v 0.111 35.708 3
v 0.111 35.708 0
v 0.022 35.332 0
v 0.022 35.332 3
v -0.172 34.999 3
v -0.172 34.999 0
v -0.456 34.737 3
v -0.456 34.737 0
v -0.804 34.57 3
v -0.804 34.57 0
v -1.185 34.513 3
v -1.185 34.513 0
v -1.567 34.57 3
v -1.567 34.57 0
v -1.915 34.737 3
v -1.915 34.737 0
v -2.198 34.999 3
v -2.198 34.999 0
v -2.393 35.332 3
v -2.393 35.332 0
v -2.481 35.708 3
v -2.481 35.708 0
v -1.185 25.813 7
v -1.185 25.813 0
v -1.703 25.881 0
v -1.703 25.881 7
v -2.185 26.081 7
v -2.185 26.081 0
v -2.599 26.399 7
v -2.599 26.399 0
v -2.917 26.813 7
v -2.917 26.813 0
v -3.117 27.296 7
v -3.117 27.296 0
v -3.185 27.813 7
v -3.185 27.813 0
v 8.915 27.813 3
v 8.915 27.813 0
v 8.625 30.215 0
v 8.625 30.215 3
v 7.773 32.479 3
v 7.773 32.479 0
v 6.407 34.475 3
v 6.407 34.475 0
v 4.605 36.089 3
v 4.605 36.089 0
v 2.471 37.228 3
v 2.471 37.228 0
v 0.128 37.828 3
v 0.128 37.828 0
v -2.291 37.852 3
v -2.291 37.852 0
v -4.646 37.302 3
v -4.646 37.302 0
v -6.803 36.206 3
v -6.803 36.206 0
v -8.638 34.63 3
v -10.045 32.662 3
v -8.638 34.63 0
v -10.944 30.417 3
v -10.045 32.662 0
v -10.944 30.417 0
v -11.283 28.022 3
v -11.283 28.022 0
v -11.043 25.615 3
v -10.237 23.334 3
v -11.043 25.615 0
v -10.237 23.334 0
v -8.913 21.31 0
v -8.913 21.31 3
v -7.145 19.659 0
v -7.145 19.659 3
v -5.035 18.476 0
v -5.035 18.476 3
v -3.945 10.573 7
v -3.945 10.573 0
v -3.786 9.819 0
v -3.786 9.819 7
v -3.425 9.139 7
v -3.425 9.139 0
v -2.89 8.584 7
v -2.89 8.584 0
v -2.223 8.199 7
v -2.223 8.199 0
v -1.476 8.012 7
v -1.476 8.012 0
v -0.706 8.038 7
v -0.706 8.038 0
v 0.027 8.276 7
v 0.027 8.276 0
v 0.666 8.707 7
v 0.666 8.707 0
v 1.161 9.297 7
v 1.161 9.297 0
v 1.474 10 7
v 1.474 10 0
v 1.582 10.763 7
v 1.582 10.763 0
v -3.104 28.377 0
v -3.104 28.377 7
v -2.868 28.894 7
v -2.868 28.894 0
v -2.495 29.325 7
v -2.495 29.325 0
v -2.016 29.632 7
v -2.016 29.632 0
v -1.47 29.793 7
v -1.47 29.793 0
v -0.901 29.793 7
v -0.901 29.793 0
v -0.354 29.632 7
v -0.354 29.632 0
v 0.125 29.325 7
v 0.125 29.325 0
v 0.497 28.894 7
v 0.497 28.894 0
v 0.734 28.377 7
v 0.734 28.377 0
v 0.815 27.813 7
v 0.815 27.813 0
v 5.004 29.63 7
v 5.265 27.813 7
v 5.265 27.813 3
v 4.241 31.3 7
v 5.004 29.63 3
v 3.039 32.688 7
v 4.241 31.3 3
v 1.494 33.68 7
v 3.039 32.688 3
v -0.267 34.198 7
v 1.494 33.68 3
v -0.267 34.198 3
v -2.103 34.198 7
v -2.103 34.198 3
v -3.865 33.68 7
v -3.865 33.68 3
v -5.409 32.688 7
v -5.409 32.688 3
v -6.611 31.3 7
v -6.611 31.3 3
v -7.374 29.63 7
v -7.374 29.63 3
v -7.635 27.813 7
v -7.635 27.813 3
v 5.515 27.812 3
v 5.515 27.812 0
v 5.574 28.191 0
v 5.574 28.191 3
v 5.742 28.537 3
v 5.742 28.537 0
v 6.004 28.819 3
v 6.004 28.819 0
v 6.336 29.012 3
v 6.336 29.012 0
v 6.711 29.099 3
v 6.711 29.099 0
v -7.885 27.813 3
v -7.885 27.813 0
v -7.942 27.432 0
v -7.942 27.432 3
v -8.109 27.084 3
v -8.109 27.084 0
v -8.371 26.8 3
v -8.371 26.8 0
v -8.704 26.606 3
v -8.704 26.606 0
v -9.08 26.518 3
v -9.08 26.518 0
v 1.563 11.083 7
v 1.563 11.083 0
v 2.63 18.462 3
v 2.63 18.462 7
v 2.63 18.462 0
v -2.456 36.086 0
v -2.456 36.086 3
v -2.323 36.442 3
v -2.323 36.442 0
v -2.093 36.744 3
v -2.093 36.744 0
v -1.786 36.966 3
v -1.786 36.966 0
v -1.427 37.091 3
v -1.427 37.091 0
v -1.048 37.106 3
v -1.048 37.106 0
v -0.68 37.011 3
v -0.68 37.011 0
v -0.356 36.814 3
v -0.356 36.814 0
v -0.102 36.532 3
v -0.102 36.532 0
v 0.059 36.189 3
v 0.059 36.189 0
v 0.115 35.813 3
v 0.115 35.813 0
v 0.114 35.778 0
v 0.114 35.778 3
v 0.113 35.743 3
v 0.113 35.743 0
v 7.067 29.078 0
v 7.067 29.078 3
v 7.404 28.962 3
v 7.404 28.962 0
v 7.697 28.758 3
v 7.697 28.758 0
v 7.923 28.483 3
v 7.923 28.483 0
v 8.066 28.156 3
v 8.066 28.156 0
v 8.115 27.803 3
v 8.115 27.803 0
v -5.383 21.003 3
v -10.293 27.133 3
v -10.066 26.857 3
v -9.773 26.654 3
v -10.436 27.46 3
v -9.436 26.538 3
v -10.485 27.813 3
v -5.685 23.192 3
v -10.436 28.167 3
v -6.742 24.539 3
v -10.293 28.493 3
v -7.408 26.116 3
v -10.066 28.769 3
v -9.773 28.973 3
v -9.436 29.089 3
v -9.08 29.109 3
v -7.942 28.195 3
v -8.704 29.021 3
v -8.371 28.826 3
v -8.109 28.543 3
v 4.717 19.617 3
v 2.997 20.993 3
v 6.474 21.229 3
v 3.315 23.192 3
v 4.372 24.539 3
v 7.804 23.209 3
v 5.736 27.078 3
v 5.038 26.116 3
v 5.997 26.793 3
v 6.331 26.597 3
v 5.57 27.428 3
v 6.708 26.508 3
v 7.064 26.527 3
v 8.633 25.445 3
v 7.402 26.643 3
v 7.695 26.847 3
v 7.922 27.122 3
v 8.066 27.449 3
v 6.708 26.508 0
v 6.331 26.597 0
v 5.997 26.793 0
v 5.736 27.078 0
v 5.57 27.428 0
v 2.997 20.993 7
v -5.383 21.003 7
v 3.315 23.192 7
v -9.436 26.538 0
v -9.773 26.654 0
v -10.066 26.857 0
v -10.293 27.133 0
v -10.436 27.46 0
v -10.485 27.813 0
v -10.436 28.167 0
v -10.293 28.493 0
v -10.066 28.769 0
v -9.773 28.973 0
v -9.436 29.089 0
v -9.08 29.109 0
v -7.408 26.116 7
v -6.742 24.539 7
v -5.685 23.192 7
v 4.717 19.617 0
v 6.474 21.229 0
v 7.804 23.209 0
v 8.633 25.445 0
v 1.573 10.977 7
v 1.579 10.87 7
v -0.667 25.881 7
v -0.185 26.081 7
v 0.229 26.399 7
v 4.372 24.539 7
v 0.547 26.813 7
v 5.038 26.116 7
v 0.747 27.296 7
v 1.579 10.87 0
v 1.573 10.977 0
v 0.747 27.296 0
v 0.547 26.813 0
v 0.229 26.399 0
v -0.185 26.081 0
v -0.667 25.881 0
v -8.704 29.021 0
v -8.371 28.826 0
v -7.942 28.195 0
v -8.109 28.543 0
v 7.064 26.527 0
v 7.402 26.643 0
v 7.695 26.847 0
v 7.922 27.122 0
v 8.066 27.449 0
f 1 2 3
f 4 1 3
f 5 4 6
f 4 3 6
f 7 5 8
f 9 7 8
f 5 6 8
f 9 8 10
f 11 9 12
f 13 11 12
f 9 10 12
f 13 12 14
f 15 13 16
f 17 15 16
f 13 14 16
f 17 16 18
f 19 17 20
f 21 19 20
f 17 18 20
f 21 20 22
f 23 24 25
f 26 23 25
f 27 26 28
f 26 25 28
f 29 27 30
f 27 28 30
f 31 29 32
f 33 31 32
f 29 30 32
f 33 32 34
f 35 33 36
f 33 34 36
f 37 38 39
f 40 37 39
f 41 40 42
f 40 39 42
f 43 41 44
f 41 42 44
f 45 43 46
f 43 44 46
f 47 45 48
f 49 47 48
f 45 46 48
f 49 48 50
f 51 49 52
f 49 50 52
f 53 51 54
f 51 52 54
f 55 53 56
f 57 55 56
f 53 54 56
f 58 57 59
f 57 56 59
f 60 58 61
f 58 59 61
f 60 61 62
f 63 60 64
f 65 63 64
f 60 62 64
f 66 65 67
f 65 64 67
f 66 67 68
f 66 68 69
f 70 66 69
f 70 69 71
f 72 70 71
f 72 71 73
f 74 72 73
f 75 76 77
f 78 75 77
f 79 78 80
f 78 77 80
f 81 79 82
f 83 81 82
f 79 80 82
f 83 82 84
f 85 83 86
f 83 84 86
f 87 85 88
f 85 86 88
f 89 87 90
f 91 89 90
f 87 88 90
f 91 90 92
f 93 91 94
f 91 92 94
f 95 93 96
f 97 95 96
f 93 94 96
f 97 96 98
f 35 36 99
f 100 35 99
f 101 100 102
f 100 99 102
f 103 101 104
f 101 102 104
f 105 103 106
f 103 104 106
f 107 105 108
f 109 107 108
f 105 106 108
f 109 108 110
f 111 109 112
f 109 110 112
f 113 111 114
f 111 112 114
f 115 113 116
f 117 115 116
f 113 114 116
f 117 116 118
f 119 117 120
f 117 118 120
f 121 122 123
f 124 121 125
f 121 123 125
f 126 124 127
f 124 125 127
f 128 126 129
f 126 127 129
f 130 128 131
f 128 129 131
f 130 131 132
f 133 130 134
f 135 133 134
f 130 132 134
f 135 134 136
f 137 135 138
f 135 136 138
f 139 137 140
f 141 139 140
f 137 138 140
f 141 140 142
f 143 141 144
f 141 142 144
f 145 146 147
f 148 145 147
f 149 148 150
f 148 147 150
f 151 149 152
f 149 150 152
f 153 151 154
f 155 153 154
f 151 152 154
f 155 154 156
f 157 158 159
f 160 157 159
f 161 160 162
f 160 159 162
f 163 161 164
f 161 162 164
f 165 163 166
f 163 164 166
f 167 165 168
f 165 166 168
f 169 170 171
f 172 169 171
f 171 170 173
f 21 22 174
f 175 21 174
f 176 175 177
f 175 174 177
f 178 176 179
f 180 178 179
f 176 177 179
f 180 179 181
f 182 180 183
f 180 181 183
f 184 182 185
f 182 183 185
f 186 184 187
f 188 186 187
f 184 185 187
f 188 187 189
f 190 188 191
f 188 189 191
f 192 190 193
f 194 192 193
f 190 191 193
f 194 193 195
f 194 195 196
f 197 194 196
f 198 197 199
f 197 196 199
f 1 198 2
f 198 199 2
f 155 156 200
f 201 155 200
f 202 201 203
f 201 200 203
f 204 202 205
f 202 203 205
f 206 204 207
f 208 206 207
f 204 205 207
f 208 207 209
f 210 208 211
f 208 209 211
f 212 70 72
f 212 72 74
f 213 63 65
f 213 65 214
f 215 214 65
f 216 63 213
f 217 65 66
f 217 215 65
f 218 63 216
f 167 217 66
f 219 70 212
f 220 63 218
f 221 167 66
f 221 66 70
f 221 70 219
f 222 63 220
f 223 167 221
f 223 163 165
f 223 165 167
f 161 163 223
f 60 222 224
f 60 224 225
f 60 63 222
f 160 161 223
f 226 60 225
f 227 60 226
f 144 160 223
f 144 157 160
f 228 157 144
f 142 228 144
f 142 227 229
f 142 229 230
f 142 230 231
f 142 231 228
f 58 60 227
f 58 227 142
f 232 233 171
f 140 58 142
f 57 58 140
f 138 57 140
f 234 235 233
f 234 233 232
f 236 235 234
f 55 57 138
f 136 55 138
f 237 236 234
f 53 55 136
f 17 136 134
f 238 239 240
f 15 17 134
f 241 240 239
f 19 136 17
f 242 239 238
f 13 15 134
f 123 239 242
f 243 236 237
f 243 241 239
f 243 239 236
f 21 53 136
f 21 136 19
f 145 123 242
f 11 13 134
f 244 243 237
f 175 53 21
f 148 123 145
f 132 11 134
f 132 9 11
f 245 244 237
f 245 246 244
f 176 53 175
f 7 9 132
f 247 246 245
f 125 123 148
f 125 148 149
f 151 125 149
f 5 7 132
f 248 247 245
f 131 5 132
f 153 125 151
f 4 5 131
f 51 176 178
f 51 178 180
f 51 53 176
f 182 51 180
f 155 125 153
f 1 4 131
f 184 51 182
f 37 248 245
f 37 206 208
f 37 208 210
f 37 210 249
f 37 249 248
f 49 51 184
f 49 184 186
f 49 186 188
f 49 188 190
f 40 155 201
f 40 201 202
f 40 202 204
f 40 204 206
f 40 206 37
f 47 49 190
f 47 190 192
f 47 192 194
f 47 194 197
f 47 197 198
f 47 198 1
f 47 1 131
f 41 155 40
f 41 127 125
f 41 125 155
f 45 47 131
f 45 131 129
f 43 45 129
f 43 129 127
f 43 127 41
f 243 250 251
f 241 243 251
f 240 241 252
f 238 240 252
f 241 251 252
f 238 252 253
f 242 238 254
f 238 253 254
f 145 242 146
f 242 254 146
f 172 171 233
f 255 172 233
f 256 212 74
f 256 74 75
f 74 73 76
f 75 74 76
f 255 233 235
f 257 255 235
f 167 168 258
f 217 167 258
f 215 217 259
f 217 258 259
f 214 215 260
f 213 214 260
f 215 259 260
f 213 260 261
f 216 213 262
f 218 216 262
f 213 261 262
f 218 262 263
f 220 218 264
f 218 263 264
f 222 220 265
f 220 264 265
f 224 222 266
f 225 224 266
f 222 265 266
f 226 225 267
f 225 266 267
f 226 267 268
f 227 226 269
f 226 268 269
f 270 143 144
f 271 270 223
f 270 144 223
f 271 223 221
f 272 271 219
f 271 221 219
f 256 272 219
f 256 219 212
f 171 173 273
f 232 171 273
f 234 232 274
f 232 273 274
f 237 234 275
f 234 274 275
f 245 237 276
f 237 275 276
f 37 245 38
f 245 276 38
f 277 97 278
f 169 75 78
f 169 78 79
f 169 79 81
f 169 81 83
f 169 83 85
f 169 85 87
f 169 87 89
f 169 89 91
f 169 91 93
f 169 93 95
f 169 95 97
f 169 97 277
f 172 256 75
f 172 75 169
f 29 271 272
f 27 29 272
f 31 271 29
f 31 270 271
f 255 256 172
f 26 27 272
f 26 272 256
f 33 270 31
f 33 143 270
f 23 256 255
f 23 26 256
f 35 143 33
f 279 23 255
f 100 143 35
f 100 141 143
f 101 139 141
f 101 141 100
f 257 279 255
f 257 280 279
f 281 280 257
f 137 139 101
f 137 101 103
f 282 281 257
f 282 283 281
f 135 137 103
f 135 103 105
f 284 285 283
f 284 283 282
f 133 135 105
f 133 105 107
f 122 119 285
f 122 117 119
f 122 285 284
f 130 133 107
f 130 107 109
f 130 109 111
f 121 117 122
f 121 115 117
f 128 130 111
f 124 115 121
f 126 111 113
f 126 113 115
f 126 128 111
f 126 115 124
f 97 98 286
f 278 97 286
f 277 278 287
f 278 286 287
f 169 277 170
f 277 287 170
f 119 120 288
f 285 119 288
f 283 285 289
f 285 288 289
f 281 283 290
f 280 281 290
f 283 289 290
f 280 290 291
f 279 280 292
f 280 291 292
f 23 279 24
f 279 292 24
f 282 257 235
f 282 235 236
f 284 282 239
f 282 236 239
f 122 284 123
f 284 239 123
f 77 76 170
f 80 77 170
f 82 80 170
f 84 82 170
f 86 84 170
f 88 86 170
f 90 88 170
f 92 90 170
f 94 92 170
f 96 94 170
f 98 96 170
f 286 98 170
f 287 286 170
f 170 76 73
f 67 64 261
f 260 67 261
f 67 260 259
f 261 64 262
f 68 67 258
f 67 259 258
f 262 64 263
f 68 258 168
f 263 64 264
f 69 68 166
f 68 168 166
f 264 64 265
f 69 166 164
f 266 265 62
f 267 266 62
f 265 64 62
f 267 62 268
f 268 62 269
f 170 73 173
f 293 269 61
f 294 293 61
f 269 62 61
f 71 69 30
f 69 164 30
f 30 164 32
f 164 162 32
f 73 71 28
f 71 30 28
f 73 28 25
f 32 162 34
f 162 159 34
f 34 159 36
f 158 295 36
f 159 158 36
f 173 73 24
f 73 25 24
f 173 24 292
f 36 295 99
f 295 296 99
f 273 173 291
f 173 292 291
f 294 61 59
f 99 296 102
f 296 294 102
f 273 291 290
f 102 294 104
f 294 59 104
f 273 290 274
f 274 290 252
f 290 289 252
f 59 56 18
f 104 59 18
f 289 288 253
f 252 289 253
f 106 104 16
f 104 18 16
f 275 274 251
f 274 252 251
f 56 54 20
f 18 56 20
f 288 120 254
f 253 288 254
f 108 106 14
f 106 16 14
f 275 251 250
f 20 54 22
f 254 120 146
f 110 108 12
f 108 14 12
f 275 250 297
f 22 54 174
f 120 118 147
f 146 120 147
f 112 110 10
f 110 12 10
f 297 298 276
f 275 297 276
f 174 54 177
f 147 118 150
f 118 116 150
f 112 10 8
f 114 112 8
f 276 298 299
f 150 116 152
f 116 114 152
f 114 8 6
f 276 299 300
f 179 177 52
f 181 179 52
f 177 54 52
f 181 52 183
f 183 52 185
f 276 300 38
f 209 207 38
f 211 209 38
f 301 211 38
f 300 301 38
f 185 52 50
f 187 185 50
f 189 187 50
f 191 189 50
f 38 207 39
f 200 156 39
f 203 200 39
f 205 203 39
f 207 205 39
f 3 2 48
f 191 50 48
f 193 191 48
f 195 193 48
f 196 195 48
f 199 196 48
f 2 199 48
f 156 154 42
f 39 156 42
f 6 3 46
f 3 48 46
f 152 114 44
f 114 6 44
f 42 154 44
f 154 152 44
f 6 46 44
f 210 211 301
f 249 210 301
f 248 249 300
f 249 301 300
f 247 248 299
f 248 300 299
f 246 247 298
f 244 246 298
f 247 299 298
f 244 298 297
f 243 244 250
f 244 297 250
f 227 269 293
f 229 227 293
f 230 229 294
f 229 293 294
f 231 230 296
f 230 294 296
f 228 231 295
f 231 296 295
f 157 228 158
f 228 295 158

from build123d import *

# Parameters (mm, degrees)
F1_DEPTH = 7
F2_DEPTH = 3
F3_DEPTH = 3


# Not quite as in the source:
# - a feature names something its author has since deleted; it is built from what else it names


with BuildPart() as f1:
    # F0 (on Top) → F1 (new body)
    with BuildSketch(Plane.XY):
        with BuildLine():
            Line((-1.1851356201, 23.1923339907), (-5.6851356201, 23.1923339907))
            ThreePointArc((-5.6851356201, 23.1923339907), (-3.6139055058, 21.83796352), (-1.1851356201, 21.3632105309))
            Line((-1.1851356201, 21.3632105309), (-1.1851356201, 23.1923339907))
        make_face()
        with BuildLine():
            ThreePointArc((-1.1851356201, 21.3632105309), (1.2436342657, 21.83796352), (3.3148643799, 23.1923339907))
            Line((3.3148643799, 23.1923339907), (-1.1851356201, 23.1923339907))
            Line((-1.1851356201, 23.1923339907), (-1.1851356201, 21.3632105309))
        make_face()
        with BuildLine():
            ThreePointArc((-7.6351356201, 27.8132105309), (-7.1276729569, 25.3054725063), (-5.6851356201, 23.1923339907))
            Line((-5.6851356201, 23.1923339907), (-1.1851356201, 23.1923339907))
            Line((-1.1851356201, 23.1923339907), (-1.1851356201, 25.8132105309))
            ThreePointArc((-1.1851356201, 25.8132105309), (-2.5993491824, 26.3989969686), (-3.1851356201, 27.8132105309))
            Line((-3.1851356201, 27.8132105309), (-7.6351356201, 27.8132105309))
        make_face()
        with BuildLine():
            Line((-1.1851356201, 23.1923339907), (3.3148643799, 23.1923339907))
            ThreePointArc((3.3148643799, 23.1923339907), (4.7574017168, 25.3054725063), (5.2648643799, 27.8132105309))
            Line((5.2648643799, 27.8132105309), (0.8148643799, 27.8132105309))
            ThreePointArc((0.8148643799, 27.8132105309), (0.2290779423, 26.3989969686), (-1.1851356201, 25.8132105309))
            Line((-1.1851356201, 25.8132105309), (-1.1851356201, 23.1923339907))
        make_face()
        with BuildLine():
            Line((-5.0348369716, 18.4756626995), (-3.9452707751, 10.572946599))
            ThreePointArc((-3.9452707751, 10.572946599), (-3.2076275018, 12.6510857986), (-1.1851356201, 13.5298956301))
            Line((-1.1851356201, 13.5298956301), (-1.1851356201, 17.7132105309))
            ThreePointArc((-1.18513562, 17.7132105309), (-3.1473750171, 17.9056570212), (-5.0348369716, 18.4756626995))
        make_face()
        with BuildLine():
            ThreePointArc((-3.9452707751, 10.572946599), (-1.0899472994, 7.9981634027), (1.5815494791, 10.7632105309))
            ThreePointArc((1.5815494791, 10.7632105309), (1.5769058667, 10.923439316), (1.562990617, 11.0831302441))
            ThreePointArc((1.562990617, 11.0831302441), (0.6546237847, 12.8295676566), (-1.1851356201, 13.5298956301))
            ThreePointArc((-1.1851356201, 13.5298956301), (-3.2076275018, 12.6510857986), (-3.9452707751, 10.572946599))
        make_face()
        with BuildLine():
            Line((-5.3833250343, 21.0032761963), (-5.0348369716, 18.4756626995))
            ThreePointArc((-5.0348369716, 18.4756626995), (-3.1473750171, 17.9056570212), (-1.18513562, 17.7132105309))
            Line((-1.1851356201, 17.7132105309), (-1.1851356201, 19.8132105309))
            ThreePointArc((-1.1851356201, 19.8132105309), (-3.3669382375, 20.1164750321), (-5.3833250343, 21.0032761963))
        make_face()
        with BuildLine():
            Line((-5.6851356201, 23.1923339907), (-5.3833250343, 21.0032761963))
            ThreePointArc((-5.3833250343, 21.0032761963), (-3.3669382375, 20.1164750321), (-1.1851356201, 19.8132105309))
            Line((-1.1851356201, 19.8132105309), (-1.1851356201, 21.3632105309))
            ThreePointArc((-1.1851356201, 21.3632105309), (-3.6139055058, 21.83796352), (-5.6851356201, 23.1923339907))
        make_face()
        with BuildLine():
            ThreePointArc((-1.1851356201, 13.5298956301), (0.6546237847, 12.8295676566), (1.562990617, 11.0831302441))
            Line((1.562990617, 11.0831302441), (2.630466448, 18.461676921))
            ThreePointArc((2.630466448, 18.461676921), (0.7590236506, 17.9020933018), (-1.18513562, 17.7132105309))
            Line((-1.1851356201, 17.7132105309), (-1.1851356201, 13.5298956301))
        make_face()
        with BuildLine():
            ThreePointArc((-1.18513562, 17.7132105309), (0.7590236506, 17.9020933018), (2.630466448, 18.461676921))
            Line((2.630466448, 18.461676921), (2.9967135721, 20.993229788))
            ThreePointArc((2.9967135721, 20.993229788), (0.9874382057, 20.1138649112), (-1.1851356201, 19.8132105309))
            Line((-1.1851356201, 19.8132105309), (-1.1851356201, 17.7132105309))
        make_face()
        with BuildLine():
            ThreePointArc((-1.1851356201, 19.8132105309), (0.9874382057, 20.1138649112), (2.9967135721, 20.993229788))
            Line((2.9967135721, 20.993229788), (3.3148643799, 23.1923339907))
            ThreePointArc((3.3148643799, 23.1923339907), (1.2436342657, 21.83796352), (-1.1851356201, 21.3632105309))
            Line((-1.1851356201, 21.3632105309), (-1.1851356201, 19.8132105309))
        make_face()
        with BuildLine():
            Line((0.8148643799, 27.8132105309), (5.2648643799, 27.8132105309))
            ThreePointArc((5.2648643799, 27.8132105309), (-1.1851356201, 34.2632105309), (-7.6351356201, 27.8132105309))
            Line((-7.6351356201, 27.8132105309), (-3.1851356201, 27.8132105309))
            ThreePointArc((-3.1851356201, 27.8132105309), (-1.1851356201, 29.8132105309), (0.8148643799, 27.8132105309))
        make_face()
    extrude(amount=F1_DEPTH)

    # F0 (on Top) → F2 (join)
    with BuildSketch(Plane.XY):
        with BuildLine():
            Line((2.9967135721, 20.993229788), (2.630466448, 18.461676921))
            ThreePointArc((2.630466448, 18.461676921), (7.1978107858, 22.179720533), (8.9148643799, 27.8132105309))
            ThreePointArc((8.9148643799, 27.8132105309), (-6.8033211078, 36.2064215866), (-5.0348369716, 18.4756626995))
            Line((-5.0348369716, 18.4756626995), (-5.3833250343, 21.0032761963))
            ThreePointArc((-5.3833250343, 21.0032761963), (-7.8303759033, 23.3589113068), (-9.0795106201, 26.5175086519))
            ThreePointArc((-9.0795106201, 26.5175086519), (-10.4851356201, 27.8132105309), (-9.0795106201, 29.10891241))
            ThreePointArc((-9.0795106201, 29.10891241), (-6.8419898695, 33.4700647804), (-2.4808374991, 35.7075855309))
            ThreePointArc((-2.4808374991, 35.7075855309), (-1.237991827, 37.1121355562), (0.1148643799, 35.8132105309))
            ThreePointArc((0.1148643799, 35.8132105309), (0.1137894053, 35.7603543239), (0.110566259, 35.7075855309))
            ThreePointArc((0.110566259, 35.7075855309), (4.4752873931, 33.4664937639), (6.7108684576, 29.0989475203))
            ThreePointArc((6.7108684576, 29.0989475203), (7.6965647575, 28.7584108036), (8.1148580079, 27.803113359))
            ThreePointArc((8.1148580079, 27.803113359), (7.6953583299, 26.8467038322), (6.7075977264, 26.5075458262))
            ThreePointArc((6.7075977264, 26.5075458262), (5.4519425182, 23.3467584953), (2.9967135721, 20.993229788))
        make_face()
        with BuildLine():
            ThreePointArc((-9.0795106201, 26.5175086519), (-7.8303759033, 23.3589113068), (-5.3833250343, 21.0032761963))
            Line((-5.3833250343, 21.0032761963), (-5.6851356201, 23.1923339907))
            ThreePointArc((-5.6851356201, 23.1923339907), (-7.1276729569, 25.3054725063), (-7.6351356201, 27.8132105309))
            Line((-7.6351356201, 27.8132105309), (-7.8851356201, 27.8132105309))
            ThreePointArc((-7.8851356201, 27.8132105309), (-8.229281944, 26.9321068197), (-9.0795106201, 26.5175086519))
        make_face()
    extrude(amount=F2_DEPTH)

    # F0 (on Top) → F3 (join)
    with BuildSketch(Plane.XY):
        with BuildLine():
            Line((3.3148643799, 23.1923339907), (2.9967135721, 20.993229788))
            ThreePointArc((2.9967135721, 20.993229788), (5.4519425182, 23.3467584953), (6.7075977264, 26.5075458262))
            ThreePointArc((6.7075977264, 26.5075458262), (5.8555856645, 26.9257328422), (5.5148855907, 27.81158181))
            Line((5.5148855907, 27.81158181), (5.2648643799, 27.8132105309))
            ThreePointArc((5.2648643799, 27.8132105309), (4.7574017168, 25.3054725063), (3.3148643799, 23.1923339907))
        make_face()
        with BuildLine():
            ThreePointArc((-7.6351356201, 27.8132105309), (-1.1851356201, 34.2632105309), (5.2648643799, 27.8132105309))
            Line((5.2648643799, 27.8132105309), (5.5148855907, 27.81158181))
            ThreePointArc((5.5148855907, 27.81158181), (5.8624374498, 28.6879269442), (6.7108684576, 29.0989475203))
            ThreePointArc((6.7108684576, 29.0989475203), (4.4752873931, 33.4664937639), (0.110566259, 35.7075855309))
            ThreePointArc((0.110566259, 35.7075855309), (-1.1851356201, 34.5132105309), (-2.4808374991, 35.7075855309))
            ThreePointArc((-2.4808374991, 35.7075855309), (-6.8419898695, 33.4700647804), (-9.0795106201, 29.10891241))
            ThreePointArc((-9.0795106201, 29.10891241), (-8.229281944, 28.6943142422), (-7.8851356201, 27.8132105309))
            Line((-7.8851356201, 27.8132105309), (-7.6351356201, 27.8132105309))
        make_face()
    extrude(amount=F3_DEPTH)


solid = f1.part
